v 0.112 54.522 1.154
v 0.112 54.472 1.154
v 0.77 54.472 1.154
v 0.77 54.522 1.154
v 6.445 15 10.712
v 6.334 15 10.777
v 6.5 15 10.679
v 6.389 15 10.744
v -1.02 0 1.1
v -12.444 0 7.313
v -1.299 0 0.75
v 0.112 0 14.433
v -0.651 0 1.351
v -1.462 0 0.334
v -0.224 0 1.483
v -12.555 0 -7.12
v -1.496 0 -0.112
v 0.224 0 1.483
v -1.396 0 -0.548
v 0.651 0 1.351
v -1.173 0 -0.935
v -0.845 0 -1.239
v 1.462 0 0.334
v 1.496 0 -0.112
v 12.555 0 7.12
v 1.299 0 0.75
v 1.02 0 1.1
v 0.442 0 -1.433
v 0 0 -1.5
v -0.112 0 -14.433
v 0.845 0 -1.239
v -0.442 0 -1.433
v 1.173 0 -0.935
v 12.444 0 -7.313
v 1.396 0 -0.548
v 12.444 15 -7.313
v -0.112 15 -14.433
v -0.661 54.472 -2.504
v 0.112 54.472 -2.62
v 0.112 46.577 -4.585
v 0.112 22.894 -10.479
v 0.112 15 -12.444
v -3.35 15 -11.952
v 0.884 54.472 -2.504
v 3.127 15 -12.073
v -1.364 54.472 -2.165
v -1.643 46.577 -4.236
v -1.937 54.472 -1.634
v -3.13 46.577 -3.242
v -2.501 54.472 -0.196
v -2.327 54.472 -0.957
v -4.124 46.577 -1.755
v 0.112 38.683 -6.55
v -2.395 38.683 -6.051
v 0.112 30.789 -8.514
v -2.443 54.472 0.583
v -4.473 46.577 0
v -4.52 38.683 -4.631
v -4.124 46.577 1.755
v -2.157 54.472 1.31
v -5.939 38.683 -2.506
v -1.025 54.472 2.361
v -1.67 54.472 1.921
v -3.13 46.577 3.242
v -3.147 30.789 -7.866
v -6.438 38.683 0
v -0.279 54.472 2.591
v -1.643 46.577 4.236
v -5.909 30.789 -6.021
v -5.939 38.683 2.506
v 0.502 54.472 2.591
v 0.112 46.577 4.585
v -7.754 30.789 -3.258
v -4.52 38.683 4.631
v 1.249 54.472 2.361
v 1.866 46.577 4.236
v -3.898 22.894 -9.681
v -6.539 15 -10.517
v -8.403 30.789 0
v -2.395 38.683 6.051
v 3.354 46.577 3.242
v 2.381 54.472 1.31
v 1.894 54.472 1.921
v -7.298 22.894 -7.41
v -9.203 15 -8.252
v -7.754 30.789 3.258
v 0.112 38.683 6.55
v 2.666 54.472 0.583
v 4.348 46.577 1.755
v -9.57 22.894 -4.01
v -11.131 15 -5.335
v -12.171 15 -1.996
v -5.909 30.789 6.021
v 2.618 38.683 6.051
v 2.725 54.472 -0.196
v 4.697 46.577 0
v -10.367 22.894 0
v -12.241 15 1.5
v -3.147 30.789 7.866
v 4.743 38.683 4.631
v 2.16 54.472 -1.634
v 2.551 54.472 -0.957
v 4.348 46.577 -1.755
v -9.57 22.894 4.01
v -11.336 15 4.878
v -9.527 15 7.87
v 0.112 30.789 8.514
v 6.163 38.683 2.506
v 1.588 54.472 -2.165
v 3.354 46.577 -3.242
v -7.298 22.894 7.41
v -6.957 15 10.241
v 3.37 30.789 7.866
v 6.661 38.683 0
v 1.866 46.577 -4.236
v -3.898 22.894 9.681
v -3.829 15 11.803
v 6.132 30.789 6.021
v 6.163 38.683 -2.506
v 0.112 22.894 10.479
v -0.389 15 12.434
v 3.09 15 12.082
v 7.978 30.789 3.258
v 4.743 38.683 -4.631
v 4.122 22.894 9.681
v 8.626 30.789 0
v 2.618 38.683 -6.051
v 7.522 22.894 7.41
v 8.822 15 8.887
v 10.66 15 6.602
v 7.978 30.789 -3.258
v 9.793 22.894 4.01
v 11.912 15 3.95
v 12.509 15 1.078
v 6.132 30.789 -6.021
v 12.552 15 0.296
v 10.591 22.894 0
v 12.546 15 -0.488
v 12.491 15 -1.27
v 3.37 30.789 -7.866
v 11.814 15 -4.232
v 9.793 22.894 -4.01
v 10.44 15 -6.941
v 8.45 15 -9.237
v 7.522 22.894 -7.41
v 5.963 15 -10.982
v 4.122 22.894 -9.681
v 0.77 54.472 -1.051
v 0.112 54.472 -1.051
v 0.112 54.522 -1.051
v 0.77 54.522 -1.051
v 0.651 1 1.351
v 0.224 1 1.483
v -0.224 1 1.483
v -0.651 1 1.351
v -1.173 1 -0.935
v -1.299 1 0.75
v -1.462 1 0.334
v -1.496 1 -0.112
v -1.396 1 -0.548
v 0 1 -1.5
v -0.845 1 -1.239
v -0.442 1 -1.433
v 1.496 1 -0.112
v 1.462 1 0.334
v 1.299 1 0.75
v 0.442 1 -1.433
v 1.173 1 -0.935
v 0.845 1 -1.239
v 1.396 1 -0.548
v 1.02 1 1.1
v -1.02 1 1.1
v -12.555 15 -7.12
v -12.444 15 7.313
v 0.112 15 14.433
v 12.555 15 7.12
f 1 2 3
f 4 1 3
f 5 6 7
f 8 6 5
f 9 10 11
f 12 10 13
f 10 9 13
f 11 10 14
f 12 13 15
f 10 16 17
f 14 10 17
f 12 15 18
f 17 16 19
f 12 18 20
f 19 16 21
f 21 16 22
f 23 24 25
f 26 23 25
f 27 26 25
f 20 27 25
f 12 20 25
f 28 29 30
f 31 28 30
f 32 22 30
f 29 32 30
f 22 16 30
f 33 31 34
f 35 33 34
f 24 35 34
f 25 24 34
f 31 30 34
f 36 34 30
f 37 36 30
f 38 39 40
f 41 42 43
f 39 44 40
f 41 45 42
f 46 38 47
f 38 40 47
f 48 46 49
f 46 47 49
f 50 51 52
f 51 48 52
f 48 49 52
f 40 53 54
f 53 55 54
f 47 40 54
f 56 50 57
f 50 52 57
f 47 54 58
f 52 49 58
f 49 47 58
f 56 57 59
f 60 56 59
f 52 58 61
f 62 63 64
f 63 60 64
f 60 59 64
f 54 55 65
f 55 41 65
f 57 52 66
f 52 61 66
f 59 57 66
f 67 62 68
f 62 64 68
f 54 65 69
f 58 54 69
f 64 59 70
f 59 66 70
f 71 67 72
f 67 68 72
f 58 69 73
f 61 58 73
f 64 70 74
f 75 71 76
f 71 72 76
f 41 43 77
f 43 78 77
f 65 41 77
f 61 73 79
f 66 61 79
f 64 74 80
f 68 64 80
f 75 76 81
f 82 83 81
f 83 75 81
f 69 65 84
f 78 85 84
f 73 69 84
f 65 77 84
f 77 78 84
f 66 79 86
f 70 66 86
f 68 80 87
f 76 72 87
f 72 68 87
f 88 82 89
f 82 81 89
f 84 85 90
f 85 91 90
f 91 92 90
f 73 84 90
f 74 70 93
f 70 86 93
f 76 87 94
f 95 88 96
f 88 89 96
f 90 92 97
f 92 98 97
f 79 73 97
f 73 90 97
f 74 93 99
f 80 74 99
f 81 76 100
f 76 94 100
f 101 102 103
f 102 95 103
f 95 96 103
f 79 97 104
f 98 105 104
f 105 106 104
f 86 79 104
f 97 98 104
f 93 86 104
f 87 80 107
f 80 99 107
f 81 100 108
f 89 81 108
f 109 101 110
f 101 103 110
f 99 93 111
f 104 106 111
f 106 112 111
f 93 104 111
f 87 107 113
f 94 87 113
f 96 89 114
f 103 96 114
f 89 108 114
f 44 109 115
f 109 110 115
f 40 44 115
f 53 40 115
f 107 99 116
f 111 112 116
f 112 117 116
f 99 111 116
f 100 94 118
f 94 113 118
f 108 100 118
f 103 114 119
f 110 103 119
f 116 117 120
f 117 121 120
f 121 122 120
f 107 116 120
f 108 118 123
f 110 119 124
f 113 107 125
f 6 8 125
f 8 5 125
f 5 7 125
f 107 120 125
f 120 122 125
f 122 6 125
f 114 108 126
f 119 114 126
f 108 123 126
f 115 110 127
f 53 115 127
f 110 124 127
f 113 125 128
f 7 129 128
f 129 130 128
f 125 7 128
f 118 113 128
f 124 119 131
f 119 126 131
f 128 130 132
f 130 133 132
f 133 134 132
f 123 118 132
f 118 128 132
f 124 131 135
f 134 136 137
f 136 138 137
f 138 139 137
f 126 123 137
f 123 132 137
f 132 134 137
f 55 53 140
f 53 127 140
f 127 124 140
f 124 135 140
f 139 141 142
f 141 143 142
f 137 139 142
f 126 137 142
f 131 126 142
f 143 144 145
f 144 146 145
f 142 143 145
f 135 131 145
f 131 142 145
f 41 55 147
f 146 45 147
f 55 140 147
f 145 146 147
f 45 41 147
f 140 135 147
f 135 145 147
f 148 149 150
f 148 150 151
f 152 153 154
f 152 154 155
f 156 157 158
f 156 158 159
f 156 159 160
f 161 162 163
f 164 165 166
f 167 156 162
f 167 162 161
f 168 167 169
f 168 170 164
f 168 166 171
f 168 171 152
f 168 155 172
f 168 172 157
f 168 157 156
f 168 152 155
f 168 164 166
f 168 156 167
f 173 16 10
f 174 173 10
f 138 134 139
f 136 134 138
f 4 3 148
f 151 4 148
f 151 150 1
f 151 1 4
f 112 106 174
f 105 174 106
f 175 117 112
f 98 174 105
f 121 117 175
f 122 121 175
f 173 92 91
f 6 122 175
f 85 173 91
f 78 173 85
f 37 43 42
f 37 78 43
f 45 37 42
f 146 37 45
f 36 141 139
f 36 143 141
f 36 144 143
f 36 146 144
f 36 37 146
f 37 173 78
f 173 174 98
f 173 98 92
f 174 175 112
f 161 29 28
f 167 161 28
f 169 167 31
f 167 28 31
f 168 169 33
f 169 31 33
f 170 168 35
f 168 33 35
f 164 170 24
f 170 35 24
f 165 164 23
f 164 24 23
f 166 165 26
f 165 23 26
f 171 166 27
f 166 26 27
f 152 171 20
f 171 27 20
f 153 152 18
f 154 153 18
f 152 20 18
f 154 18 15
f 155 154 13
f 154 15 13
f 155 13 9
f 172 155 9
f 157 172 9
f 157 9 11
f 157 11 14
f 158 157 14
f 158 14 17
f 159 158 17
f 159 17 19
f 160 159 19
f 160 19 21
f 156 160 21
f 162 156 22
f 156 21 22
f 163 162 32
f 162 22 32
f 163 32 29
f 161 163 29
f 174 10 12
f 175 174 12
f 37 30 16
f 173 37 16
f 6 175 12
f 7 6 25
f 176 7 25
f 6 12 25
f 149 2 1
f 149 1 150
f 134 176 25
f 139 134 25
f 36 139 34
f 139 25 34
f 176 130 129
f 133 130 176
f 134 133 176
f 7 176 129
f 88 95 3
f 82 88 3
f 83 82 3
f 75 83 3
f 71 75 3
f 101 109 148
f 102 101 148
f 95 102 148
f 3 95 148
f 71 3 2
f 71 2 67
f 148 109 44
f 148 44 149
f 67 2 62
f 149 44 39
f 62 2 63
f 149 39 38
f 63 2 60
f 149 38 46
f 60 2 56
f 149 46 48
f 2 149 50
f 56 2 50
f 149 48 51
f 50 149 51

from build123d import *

# Parameters (mm, degrees)
SALIENTE_EXTRUIR1_DEPTH = 15
CROQUIS7_W              = 14.43375673
CROQUIS7_H              = 12.305430405
CORTAR_EXTRUIR1_DEPTH   = 73.231152958
CROQUIS8_R              = 1.5
CORTAR_EXTRUIR2_DEPTH   = 1
CROQUIS10_W             = 0.658671327
CROQUIS10_H             = 2.205507173
SALIENTE_EXTRUIR2_DEPTH = 0.05


with BuildPart() as part:
    # Croquis1 → Saliente-Extruir1 (new body)
    with BuildSketch(Plane(origin=(0, 0, 0), x_dir=(1, 0, 0), z_dir=(0, 1, 0))):
        Polygon((12.555498777, -7.119886502), (12.443751971, 7.313437647), (-0.111746806, 14.433324149), (-12.555498777, 7.119886502), (-12.443751971, -7.313437647), (0.111746806, -14.433324149), align=None)
    extrude(amount=SALIENTE_EXTRUIR1_DEPTH)

    # Croquis6 → Revolución3 (revolve)
    with BuildSketch(Plane.XY, mode=Mode.PRIVATE) as revoluci_n3_sk:
        Polygon((0.111746806, 15), (0.111746806, 65), (12.555498777, 15), align=None)
    revolve(revoluci_n3_sk.sketch.rotate(Axis((0.111746806, 15, 0), (0, 1, 0)), 90), axis=Axis((0.111746806, 15, 0), (0, 1, 0)))

    # Croquis7 → Cortar-Extruir1 (cut, through all)
    with BuildSketch(Plane(origin=(-6.333622792, 0, -10.776605325), x_dir=(-0.8621284260151223, 0, 0.5066898233206265), z_dir=(-0.5066898233206265, 0, -0.8621284260151223))):
        with Locations((0, 60.624376817)):
            Rectangle(CROQUIS7_W, CROQUIS7_H)
    extrude(amount=-CORTAR_EXTRUIR1_DEPTH, mode=Mode.SUBTRACT)

    # Croquis8 → Cortar-Extruir2 (cut)
    with BuildSketch(Plane(origin=(0, 0, 0), x_dir=(-1, 0, 0), z_dir=(0, -1, 0))):
        with Locations(Location((0, 0, 0), (0, 0, 90))):
            Circle(CROQUIS8_R)
    extrude(amount=-CORTAR_EXTRUIR2_DEPTH, mode=Mode.SUBTRACT)

    # Croquis10 → Saliente-Extruir2 (add)
    with BuildSketch(Plane(origin=(0, 54.471661615, 0), x_dir=(1, 0, 0), z_dir=(0, 1, 0))):
        with Locations((0.44108247, -0.051671434)):
            Rectangle(CROQUIS10_W, CROQUIS10_H)
    extrude(amount=SALIENTE_EXTRUIR2_DEPTH)


solid = part.part
